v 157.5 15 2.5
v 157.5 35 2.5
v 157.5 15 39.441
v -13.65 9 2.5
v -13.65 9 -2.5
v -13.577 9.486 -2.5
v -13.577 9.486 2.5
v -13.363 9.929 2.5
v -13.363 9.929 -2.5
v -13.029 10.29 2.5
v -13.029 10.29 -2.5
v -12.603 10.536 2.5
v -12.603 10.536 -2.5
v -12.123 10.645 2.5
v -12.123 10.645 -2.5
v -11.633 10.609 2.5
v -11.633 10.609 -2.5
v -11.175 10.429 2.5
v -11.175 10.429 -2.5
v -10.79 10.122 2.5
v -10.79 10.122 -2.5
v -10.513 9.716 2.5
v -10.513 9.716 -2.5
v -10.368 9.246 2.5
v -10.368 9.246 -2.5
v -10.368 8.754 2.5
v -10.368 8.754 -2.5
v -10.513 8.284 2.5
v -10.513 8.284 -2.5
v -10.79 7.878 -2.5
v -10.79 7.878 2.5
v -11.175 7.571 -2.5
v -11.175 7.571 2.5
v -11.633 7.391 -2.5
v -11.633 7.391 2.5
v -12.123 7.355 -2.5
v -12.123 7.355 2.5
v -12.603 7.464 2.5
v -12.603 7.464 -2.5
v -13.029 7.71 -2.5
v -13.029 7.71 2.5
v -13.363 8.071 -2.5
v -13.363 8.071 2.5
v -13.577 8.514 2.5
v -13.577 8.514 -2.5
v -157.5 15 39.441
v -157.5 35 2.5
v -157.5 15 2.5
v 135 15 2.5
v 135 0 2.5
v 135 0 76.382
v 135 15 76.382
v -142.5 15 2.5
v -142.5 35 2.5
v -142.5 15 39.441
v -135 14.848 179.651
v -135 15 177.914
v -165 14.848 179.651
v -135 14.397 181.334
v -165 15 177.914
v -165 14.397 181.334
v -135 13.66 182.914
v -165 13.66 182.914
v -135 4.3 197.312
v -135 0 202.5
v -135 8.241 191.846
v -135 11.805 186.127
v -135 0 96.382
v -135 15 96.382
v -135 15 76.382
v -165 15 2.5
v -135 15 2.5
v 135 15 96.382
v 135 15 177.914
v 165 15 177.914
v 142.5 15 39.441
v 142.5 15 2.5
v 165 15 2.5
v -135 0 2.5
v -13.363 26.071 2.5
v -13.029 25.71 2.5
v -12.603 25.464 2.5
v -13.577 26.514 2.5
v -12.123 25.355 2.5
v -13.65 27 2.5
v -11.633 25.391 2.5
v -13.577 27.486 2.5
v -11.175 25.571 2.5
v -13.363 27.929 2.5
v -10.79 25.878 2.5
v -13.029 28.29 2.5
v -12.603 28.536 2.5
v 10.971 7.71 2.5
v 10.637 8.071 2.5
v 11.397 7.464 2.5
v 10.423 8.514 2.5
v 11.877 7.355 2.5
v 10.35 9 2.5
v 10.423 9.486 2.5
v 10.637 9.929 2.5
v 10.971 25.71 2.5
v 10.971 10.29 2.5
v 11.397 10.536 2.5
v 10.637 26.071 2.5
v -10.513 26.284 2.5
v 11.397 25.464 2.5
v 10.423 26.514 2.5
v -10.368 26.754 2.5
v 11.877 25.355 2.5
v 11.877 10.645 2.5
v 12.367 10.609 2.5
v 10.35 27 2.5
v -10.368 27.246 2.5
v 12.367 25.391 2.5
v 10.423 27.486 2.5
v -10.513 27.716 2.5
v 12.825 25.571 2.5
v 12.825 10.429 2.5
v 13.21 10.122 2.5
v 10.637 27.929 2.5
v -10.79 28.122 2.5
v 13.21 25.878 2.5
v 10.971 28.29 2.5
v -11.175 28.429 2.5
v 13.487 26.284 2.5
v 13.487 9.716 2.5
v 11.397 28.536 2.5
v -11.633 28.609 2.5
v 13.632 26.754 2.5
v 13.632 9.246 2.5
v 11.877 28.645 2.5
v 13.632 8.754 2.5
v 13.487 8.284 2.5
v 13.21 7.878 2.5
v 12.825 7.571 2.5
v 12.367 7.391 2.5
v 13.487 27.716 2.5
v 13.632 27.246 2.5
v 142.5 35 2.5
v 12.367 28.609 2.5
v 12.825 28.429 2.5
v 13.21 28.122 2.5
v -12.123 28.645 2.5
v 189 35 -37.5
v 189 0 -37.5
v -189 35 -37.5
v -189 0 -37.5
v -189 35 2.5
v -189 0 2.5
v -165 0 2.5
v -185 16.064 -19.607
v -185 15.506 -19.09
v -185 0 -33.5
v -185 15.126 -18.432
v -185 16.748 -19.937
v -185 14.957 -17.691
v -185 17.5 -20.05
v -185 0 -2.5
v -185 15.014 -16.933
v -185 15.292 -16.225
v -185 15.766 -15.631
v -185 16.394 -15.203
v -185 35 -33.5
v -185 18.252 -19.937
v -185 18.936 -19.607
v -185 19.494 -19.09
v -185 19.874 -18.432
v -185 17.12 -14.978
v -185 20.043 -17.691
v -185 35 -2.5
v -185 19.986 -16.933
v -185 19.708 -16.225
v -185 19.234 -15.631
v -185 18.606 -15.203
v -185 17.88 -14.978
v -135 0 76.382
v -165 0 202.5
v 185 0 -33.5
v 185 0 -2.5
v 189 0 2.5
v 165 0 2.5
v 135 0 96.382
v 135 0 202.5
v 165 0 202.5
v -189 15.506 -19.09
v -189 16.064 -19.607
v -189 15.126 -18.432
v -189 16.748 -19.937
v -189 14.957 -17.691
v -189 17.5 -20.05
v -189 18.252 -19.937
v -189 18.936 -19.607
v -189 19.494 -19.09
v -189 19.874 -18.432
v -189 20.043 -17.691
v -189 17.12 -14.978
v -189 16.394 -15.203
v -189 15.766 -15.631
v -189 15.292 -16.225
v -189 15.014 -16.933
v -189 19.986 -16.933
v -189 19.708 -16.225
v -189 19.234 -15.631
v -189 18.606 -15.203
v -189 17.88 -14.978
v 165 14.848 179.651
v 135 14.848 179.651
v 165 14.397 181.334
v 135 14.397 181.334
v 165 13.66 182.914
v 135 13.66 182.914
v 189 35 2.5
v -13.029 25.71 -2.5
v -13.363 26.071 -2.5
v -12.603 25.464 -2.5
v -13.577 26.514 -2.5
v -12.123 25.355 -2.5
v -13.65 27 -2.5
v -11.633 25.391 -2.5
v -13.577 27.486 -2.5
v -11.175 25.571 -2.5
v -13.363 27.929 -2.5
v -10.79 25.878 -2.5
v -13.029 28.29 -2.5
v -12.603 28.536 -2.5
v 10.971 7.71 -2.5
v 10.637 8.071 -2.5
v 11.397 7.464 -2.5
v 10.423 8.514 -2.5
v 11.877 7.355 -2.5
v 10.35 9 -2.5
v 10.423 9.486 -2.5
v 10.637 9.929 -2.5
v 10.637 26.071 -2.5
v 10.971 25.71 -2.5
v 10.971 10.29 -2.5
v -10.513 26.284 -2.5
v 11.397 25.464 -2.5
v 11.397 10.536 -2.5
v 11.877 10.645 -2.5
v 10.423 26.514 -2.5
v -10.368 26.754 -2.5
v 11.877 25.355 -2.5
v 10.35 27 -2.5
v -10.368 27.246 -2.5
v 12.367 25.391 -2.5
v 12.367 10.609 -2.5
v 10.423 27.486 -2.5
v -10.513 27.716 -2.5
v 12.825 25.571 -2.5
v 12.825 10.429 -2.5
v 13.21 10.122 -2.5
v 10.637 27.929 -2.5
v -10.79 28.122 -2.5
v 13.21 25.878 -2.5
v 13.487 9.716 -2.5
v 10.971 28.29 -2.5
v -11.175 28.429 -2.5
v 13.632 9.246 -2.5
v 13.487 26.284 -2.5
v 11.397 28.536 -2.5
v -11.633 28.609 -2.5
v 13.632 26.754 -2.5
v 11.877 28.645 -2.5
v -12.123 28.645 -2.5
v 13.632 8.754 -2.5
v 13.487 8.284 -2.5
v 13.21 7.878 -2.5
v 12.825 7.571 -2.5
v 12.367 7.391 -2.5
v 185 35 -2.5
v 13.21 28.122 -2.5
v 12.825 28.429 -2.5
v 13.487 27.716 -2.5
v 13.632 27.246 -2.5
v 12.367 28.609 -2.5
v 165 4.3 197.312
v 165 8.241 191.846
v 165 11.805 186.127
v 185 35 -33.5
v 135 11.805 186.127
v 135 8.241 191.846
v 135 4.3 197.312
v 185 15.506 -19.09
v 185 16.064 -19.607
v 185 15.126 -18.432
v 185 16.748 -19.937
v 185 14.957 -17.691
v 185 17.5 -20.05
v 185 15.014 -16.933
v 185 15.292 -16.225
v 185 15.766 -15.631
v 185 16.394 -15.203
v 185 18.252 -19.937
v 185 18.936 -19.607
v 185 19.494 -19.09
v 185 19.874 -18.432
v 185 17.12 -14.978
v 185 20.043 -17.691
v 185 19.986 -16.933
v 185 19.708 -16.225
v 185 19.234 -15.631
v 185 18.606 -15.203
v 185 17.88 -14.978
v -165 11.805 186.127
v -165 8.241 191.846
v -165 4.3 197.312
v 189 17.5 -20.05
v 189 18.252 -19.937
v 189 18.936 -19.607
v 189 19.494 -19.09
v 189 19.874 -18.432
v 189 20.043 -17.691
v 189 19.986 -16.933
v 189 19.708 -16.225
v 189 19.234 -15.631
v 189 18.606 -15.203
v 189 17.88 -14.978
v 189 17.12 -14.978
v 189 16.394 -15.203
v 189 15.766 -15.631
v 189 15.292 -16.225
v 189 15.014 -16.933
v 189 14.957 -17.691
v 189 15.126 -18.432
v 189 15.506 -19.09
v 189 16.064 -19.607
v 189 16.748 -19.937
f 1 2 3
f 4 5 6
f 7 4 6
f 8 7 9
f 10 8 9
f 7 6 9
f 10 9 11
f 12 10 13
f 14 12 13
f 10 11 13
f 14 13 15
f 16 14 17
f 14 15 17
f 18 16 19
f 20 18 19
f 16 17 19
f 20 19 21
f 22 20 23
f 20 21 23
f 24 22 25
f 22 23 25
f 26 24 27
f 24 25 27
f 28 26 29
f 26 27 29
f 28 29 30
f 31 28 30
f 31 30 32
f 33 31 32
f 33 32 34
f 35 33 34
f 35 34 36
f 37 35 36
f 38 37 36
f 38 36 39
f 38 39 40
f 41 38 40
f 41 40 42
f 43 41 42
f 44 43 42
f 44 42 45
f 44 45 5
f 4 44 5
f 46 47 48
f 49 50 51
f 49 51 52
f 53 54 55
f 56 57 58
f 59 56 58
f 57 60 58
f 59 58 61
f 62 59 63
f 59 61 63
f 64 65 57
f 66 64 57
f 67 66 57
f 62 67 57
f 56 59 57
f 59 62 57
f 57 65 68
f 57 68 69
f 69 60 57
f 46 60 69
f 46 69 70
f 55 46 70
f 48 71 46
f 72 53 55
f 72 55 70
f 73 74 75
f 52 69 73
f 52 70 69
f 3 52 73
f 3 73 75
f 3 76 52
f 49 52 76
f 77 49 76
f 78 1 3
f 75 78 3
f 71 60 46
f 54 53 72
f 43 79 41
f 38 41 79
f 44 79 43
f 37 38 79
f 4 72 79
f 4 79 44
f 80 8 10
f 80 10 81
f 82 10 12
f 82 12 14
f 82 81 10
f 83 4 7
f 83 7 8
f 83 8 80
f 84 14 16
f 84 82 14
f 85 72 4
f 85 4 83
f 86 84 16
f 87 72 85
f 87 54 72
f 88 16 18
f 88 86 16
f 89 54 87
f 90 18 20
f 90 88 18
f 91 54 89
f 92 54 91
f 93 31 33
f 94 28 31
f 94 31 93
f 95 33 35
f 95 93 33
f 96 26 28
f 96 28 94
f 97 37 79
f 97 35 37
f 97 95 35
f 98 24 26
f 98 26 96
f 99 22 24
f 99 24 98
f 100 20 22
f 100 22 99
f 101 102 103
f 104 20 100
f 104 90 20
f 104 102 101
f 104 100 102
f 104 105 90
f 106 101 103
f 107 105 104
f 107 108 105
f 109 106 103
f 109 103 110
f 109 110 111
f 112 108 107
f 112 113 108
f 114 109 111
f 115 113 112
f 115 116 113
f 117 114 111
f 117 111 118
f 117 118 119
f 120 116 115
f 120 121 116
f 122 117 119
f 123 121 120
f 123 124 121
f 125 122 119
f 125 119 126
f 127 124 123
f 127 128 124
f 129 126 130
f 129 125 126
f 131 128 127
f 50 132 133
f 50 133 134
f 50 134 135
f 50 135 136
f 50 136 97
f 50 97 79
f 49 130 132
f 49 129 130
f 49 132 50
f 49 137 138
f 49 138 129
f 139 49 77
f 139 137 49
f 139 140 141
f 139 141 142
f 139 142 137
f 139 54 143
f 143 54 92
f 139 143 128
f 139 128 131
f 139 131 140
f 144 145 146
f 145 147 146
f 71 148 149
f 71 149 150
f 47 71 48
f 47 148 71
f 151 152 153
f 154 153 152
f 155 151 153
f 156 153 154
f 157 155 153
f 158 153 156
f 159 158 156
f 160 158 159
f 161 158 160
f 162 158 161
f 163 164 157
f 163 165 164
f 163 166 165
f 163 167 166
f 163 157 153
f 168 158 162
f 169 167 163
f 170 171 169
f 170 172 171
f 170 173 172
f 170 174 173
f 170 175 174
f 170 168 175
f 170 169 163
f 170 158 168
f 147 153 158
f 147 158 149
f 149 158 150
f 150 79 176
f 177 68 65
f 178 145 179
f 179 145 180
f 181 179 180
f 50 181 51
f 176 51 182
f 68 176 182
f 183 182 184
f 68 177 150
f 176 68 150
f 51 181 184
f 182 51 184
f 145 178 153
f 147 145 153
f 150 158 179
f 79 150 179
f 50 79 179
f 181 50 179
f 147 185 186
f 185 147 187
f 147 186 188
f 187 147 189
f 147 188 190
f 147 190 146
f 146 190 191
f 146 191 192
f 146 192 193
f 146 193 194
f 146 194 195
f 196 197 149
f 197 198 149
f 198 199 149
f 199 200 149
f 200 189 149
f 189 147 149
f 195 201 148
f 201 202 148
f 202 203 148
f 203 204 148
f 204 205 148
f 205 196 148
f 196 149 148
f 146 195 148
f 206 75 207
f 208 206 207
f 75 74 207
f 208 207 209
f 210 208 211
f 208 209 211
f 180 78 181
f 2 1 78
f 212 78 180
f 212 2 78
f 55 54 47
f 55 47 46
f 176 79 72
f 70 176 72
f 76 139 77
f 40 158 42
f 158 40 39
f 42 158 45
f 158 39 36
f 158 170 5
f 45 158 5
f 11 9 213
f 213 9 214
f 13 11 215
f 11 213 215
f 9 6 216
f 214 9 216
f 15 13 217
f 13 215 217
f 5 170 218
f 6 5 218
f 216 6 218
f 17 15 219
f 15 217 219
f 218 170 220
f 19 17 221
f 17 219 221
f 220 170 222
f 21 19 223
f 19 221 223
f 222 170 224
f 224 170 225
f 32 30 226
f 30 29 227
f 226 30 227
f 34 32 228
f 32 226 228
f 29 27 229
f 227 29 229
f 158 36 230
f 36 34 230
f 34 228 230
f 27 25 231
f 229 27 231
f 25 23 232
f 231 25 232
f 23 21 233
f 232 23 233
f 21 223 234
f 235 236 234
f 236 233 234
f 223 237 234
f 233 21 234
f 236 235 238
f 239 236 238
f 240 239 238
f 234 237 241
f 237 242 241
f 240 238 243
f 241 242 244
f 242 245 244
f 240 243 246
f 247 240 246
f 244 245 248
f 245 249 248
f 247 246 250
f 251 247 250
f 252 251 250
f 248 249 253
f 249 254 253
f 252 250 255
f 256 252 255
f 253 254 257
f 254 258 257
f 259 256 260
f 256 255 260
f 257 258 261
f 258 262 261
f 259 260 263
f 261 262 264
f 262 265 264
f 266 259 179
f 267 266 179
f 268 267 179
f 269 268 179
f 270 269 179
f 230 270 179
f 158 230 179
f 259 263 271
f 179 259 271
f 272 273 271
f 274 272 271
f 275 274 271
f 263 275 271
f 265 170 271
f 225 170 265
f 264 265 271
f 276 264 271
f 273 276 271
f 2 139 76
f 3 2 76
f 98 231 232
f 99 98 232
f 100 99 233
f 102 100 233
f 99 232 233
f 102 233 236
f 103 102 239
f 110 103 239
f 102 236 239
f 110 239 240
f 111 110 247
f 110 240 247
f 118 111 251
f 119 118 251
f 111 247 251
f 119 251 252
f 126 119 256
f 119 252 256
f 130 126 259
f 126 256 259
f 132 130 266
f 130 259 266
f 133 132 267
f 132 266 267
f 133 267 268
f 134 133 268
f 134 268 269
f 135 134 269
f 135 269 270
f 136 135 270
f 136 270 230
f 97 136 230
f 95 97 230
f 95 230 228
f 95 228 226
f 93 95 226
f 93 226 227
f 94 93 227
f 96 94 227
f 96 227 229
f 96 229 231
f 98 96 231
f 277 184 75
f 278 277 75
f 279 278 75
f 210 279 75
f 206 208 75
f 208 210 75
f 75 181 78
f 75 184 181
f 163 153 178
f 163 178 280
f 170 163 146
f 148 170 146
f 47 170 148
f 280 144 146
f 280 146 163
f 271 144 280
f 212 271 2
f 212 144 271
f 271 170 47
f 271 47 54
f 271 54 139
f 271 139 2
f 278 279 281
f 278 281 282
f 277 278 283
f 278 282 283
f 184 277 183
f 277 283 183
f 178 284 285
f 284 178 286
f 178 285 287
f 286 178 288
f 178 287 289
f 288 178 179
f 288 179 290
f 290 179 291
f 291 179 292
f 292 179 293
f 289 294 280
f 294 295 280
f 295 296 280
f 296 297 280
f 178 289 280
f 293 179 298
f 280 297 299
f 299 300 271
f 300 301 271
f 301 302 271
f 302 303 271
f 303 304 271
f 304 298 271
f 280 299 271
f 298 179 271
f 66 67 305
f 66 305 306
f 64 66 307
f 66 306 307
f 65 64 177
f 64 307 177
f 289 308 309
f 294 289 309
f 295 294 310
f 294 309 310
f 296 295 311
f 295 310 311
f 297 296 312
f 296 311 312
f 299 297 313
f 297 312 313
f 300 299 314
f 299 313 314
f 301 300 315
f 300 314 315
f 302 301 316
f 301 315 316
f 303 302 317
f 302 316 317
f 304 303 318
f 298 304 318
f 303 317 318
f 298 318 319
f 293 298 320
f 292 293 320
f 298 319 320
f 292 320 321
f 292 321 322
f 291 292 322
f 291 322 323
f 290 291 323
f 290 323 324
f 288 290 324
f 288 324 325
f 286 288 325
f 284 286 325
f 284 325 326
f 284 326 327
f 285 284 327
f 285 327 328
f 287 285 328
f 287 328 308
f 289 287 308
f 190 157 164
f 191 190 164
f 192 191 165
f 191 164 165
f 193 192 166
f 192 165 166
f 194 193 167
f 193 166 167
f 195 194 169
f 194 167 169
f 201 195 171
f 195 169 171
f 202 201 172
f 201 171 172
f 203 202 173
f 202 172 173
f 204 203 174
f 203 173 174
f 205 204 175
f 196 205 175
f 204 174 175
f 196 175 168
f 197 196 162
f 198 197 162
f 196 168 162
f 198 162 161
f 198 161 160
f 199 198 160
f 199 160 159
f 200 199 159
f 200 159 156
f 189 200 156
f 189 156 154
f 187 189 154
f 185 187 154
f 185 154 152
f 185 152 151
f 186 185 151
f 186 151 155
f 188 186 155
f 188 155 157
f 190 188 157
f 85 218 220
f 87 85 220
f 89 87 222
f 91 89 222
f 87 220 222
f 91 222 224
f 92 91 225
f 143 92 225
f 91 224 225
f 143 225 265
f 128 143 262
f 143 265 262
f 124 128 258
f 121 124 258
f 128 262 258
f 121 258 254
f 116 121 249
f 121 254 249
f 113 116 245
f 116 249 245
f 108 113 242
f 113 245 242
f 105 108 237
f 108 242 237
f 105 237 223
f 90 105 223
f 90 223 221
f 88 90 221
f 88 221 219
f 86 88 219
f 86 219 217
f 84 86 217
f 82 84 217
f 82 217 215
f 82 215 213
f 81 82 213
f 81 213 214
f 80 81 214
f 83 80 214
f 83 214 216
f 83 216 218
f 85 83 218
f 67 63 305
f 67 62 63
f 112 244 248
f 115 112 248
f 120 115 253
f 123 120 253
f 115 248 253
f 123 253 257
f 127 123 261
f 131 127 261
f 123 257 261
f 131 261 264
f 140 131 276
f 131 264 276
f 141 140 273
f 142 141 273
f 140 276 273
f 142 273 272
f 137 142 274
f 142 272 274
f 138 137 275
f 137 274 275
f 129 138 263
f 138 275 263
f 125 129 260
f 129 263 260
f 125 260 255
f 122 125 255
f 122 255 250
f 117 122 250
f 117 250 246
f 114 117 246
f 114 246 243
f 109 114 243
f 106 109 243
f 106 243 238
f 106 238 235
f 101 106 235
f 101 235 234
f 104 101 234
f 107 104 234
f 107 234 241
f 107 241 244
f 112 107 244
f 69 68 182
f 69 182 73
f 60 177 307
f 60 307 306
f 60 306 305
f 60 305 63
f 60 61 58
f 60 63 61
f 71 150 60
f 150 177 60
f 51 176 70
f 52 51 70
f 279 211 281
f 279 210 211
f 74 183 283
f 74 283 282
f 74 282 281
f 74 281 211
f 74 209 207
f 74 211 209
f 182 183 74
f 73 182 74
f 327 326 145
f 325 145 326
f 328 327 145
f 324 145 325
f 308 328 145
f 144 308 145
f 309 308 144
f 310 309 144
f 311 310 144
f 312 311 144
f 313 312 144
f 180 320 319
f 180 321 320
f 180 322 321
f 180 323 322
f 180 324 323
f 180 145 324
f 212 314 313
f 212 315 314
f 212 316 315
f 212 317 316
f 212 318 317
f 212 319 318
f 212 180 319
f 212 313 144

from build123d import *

# Parameters (mm, degrees)
SKETCH_1_W               = 378
SKETCH_1_H               = 35
EXTRUDE_1_DEPTH          = 2.5
SKETCH_3_W               = 4
SKETCH_3_H               = 35
EXTRUDE_2_DEPTH          = 35
SKETCH_4_R               = 2.55
CUT_EXTRUDE_3_DEPTH      = 382.464611727
HOLE_WIZARD_M4_6_D       = 3.3
SKETCH_6_W               = 30
SKETCH_6_H               = 15
EXTRUDE_3_DEPTH          = 200
EXTRUDE_4_REACH          = 385.676
SKETCH_15_W              = 20
SKETCH_15_H              = 15
EXTRUDE_5_REACH          = 428.74
SKETCH_17_W              = 4
SKETCH_17_H              = 35
SKETCH_18_W              = 4
SKETCH_18_H              = 35
EXTRUDE_6_DEPTH          = 185
CUT_EXTRUDE_4_DEPTH      = 410.325359586
CUT_EXTRUDE_4_DEPTH_BACK = 410.325359586
FILLET_1_R               = 100
FILLET_2_R               = 10
RIB_6_REACH              = 398.424
SKETCH_20_WALL_W         = 836.856433298
SKETCH_20_WALL_H         = 15


with BuildPart() as part:
    # 草图1 → 凸台-拉伸1 (new, symmetric)
    with BuildSketch(Plane.XY):
        with Locations((0, 17.5)):
            Rectangle(SKETCH_1_W, SKETCH_1_H)
    extrude(amount=EXTRUDE_1_DEPTH, both=True)

    # 草图3 → 凸台-拉伸2 (add)
    with BuildSketch(Plane(origin=(0, 0, -2.5), x_dir=(-1, 0, 0), z_dir=(0, 0, -1))):
        with Locations((-187, 17.5)):
            Rectangle(SKETCH_3_W, SKETCH_3_H)
        with Locations((187, 17.5)):
            Rectangle(SKETCH_3_W, SKETCH_3_H)
    extrude(amount=EXTRUDE_2_DEPTH)

    # 草图4 → 切除-拉伸3 (cut, through all)
    with BuildSketch(Plane(origin=(189, 0, 0), x_dir=(0, 0, -1), z_dir=(1, 0, 0))):
        with Locations((17.5, 17.5)):
            Circle(SKETCH_4_R)
    extrude(amount=-CUT_EXTRUDE_3_DEPTH, mode=Mode.SUBTRACT)

    # M4 螺纹孔的螺纹孔钻头6 (through all)
    with Locations(Plane.XY.offset(2.5)):
        with Locations((12, 27), (-12, 9), (-12, 27), (12, 9)):
            Hole(HOLE_WIZARD_M4_6_D / 2)

    # 草图6 → 凸台-拉伸3 (add)
    with BuildSketch(Plane.XY.offset(2.5)):
        with Locations((-150, 7.5)):
            Rectangle(SKETCH_6_W, SKETCH_6_H)
        with Locations((150, 7.5)):
            Rectangle(SKETCH_6_W, SKETCH_6_H)
    extrude(amount=EXTRUDE_3_DEPTH)

    # 草图15 → 凸台-拉伸4 (add, up to next)
    with BuildSketch(Plane(origin=(-135, 0, 0), x_dir=(0, 0, -1), z_dir=(1, 0, 0)), mode=Mode.PRIVATE) as extrude_4_sk1:
        with Locations((-86.382417222, 7.5)):
            Rectangle(SKETCH_15_W, SKETCH_15_H)
    extrude_4_tool1 = extrude(extrude_4_sk1.sketch, amount=EXTRUDE_4_REACH, mode=Mode.PRIVATE) - part.part
    add(extrude_4_tool1.solids().sort_by_distance((-135, 7.5, 86.382417))[0])

    # 草图17 → 凸台-拉伸5 (add, up to next)
    with BuildSketch(Plane.ZY.offset(-185), mode=Mode.PRIVATE) as extrude_5_sk1:
        with Locations((-35.5, 17.5)):
            Rectangle(SKETCH_17_W, SKETCH_17_H)
    extrude_5_tool1 = extrude(extrude_5_sk1.sketch, amount=EXTRUDE_5_REACH, mode=Mode.PRIVATE) - part.part
    add(extrude_5_tool1.solids().sort_by_distance((185, 17.5, -35.5))[0])

    # 草图18 → 凸台-拉伸6 (add)
    with BuildSketch(Plane(origin=(-185, 0, 0), x_dir=(0, 0, -1), z_dir=(1, 0, 0))):
        with Locations((35.5, 17.5)):
            Rectangle(SKETCH_18_W, SKETCH_18_H)
    extrude(amount=EXTRUDE_6_DEPTH)

    # 草图19 → 切除-拉伸4 (cut, two sides: drawn at the far end of the back side and taken through both)
    with BuildSketch(Plane.ZY.offset(165).offset(-CUT_EXTRUDE_4_DEPTH_BACK)):
        Polygon((-247.587382518, 262.210386508), (180.593567073, 15), (202.5, 2.352315052), (630.680949591, -244.858071456), (1125.101722607, 611.503827726), (246.833390498, 1118.57228569), align=None)
    extrude(amount=CUT_EXTRUDE_4_DEPTH + CUT_EXTRUDE_4_DEPTH_BACK, mode=Mode.SUBTRACT)

    # 圆角1
    # the kernel refuses this fillet: 100 mm, written as the material it takes off along each edge
    with BuildSketch(Plane(origin=(-212.264366854, 2.352315052, 202.5), x_dir=(0, -1, 0), z_dir=(1, 0, 0)), Plane(origin=(87.735633146, 2.352315052, 202.5), x_dir=(0, -1, 0), z_dir=(1, 0, 0))) as fillet_1_piece_1:
        with BuildLine():
            CenterArc((77.149667008, 66.372856956), FILLET_1_R, 210, 11.584858497)
            Line((-9.452873371, 16.372856956), (-11.184924178, 15.372856956))
            Line((-11.184924178, 15.372856956), (-1.732050808, -1))
            Line((-1.732050808, -1), (0, -2))
            ThreePointArc((0, -2), (1.176157526, -2), (0.856368013, -1.327457139))
            Line((0.856368013, -1.327457139), (2.352315052, 0))
        make_face()
    extrude(amount=124.528733709, mode=Mode.SUBTRACT)

    # 圆角2
    fillet_2_edges = [part.edges().sort_by_distance(p)[0] for p in [
        (150, 15, 180.593567073),
        (-150, 15, 180.593567073),
    ]]
    fillet(fillet_2_edges, radius=FILLET_2_R)

    # 草图20 wall → 筋6 (add, up to next)
    with BuildSketch(Plane(origin=(150, 25, 20.970604306), x_dir=(0, -0.476102376571, 0.879389860655), z_dir=(0, -0.879389860655, -0.476102376571)), mode=Mode.PRIVATE) as rib_6_sk1:
        Rectangle(SKETCH_20_WALL_W, SKETCH_20_WALL_H)
    rib_6_tool1 = extrude(rib_6_sk1.sketch, amount=RIB_6_REACH, mode=Mode.PRIVATE) - part.part
    rib_6 = rib_6_tool1.solids().sort_by_distance((150, 25, 20.970604306))[0]
    add(rib_6)

    # 镜向1: 筋6 across plane
    add(rib_6.mirror(Plane(origin=(0, 0, 0), x_dir=(0, 0, 1), z_dir=(1, 0, 0))))


solid = part.part
